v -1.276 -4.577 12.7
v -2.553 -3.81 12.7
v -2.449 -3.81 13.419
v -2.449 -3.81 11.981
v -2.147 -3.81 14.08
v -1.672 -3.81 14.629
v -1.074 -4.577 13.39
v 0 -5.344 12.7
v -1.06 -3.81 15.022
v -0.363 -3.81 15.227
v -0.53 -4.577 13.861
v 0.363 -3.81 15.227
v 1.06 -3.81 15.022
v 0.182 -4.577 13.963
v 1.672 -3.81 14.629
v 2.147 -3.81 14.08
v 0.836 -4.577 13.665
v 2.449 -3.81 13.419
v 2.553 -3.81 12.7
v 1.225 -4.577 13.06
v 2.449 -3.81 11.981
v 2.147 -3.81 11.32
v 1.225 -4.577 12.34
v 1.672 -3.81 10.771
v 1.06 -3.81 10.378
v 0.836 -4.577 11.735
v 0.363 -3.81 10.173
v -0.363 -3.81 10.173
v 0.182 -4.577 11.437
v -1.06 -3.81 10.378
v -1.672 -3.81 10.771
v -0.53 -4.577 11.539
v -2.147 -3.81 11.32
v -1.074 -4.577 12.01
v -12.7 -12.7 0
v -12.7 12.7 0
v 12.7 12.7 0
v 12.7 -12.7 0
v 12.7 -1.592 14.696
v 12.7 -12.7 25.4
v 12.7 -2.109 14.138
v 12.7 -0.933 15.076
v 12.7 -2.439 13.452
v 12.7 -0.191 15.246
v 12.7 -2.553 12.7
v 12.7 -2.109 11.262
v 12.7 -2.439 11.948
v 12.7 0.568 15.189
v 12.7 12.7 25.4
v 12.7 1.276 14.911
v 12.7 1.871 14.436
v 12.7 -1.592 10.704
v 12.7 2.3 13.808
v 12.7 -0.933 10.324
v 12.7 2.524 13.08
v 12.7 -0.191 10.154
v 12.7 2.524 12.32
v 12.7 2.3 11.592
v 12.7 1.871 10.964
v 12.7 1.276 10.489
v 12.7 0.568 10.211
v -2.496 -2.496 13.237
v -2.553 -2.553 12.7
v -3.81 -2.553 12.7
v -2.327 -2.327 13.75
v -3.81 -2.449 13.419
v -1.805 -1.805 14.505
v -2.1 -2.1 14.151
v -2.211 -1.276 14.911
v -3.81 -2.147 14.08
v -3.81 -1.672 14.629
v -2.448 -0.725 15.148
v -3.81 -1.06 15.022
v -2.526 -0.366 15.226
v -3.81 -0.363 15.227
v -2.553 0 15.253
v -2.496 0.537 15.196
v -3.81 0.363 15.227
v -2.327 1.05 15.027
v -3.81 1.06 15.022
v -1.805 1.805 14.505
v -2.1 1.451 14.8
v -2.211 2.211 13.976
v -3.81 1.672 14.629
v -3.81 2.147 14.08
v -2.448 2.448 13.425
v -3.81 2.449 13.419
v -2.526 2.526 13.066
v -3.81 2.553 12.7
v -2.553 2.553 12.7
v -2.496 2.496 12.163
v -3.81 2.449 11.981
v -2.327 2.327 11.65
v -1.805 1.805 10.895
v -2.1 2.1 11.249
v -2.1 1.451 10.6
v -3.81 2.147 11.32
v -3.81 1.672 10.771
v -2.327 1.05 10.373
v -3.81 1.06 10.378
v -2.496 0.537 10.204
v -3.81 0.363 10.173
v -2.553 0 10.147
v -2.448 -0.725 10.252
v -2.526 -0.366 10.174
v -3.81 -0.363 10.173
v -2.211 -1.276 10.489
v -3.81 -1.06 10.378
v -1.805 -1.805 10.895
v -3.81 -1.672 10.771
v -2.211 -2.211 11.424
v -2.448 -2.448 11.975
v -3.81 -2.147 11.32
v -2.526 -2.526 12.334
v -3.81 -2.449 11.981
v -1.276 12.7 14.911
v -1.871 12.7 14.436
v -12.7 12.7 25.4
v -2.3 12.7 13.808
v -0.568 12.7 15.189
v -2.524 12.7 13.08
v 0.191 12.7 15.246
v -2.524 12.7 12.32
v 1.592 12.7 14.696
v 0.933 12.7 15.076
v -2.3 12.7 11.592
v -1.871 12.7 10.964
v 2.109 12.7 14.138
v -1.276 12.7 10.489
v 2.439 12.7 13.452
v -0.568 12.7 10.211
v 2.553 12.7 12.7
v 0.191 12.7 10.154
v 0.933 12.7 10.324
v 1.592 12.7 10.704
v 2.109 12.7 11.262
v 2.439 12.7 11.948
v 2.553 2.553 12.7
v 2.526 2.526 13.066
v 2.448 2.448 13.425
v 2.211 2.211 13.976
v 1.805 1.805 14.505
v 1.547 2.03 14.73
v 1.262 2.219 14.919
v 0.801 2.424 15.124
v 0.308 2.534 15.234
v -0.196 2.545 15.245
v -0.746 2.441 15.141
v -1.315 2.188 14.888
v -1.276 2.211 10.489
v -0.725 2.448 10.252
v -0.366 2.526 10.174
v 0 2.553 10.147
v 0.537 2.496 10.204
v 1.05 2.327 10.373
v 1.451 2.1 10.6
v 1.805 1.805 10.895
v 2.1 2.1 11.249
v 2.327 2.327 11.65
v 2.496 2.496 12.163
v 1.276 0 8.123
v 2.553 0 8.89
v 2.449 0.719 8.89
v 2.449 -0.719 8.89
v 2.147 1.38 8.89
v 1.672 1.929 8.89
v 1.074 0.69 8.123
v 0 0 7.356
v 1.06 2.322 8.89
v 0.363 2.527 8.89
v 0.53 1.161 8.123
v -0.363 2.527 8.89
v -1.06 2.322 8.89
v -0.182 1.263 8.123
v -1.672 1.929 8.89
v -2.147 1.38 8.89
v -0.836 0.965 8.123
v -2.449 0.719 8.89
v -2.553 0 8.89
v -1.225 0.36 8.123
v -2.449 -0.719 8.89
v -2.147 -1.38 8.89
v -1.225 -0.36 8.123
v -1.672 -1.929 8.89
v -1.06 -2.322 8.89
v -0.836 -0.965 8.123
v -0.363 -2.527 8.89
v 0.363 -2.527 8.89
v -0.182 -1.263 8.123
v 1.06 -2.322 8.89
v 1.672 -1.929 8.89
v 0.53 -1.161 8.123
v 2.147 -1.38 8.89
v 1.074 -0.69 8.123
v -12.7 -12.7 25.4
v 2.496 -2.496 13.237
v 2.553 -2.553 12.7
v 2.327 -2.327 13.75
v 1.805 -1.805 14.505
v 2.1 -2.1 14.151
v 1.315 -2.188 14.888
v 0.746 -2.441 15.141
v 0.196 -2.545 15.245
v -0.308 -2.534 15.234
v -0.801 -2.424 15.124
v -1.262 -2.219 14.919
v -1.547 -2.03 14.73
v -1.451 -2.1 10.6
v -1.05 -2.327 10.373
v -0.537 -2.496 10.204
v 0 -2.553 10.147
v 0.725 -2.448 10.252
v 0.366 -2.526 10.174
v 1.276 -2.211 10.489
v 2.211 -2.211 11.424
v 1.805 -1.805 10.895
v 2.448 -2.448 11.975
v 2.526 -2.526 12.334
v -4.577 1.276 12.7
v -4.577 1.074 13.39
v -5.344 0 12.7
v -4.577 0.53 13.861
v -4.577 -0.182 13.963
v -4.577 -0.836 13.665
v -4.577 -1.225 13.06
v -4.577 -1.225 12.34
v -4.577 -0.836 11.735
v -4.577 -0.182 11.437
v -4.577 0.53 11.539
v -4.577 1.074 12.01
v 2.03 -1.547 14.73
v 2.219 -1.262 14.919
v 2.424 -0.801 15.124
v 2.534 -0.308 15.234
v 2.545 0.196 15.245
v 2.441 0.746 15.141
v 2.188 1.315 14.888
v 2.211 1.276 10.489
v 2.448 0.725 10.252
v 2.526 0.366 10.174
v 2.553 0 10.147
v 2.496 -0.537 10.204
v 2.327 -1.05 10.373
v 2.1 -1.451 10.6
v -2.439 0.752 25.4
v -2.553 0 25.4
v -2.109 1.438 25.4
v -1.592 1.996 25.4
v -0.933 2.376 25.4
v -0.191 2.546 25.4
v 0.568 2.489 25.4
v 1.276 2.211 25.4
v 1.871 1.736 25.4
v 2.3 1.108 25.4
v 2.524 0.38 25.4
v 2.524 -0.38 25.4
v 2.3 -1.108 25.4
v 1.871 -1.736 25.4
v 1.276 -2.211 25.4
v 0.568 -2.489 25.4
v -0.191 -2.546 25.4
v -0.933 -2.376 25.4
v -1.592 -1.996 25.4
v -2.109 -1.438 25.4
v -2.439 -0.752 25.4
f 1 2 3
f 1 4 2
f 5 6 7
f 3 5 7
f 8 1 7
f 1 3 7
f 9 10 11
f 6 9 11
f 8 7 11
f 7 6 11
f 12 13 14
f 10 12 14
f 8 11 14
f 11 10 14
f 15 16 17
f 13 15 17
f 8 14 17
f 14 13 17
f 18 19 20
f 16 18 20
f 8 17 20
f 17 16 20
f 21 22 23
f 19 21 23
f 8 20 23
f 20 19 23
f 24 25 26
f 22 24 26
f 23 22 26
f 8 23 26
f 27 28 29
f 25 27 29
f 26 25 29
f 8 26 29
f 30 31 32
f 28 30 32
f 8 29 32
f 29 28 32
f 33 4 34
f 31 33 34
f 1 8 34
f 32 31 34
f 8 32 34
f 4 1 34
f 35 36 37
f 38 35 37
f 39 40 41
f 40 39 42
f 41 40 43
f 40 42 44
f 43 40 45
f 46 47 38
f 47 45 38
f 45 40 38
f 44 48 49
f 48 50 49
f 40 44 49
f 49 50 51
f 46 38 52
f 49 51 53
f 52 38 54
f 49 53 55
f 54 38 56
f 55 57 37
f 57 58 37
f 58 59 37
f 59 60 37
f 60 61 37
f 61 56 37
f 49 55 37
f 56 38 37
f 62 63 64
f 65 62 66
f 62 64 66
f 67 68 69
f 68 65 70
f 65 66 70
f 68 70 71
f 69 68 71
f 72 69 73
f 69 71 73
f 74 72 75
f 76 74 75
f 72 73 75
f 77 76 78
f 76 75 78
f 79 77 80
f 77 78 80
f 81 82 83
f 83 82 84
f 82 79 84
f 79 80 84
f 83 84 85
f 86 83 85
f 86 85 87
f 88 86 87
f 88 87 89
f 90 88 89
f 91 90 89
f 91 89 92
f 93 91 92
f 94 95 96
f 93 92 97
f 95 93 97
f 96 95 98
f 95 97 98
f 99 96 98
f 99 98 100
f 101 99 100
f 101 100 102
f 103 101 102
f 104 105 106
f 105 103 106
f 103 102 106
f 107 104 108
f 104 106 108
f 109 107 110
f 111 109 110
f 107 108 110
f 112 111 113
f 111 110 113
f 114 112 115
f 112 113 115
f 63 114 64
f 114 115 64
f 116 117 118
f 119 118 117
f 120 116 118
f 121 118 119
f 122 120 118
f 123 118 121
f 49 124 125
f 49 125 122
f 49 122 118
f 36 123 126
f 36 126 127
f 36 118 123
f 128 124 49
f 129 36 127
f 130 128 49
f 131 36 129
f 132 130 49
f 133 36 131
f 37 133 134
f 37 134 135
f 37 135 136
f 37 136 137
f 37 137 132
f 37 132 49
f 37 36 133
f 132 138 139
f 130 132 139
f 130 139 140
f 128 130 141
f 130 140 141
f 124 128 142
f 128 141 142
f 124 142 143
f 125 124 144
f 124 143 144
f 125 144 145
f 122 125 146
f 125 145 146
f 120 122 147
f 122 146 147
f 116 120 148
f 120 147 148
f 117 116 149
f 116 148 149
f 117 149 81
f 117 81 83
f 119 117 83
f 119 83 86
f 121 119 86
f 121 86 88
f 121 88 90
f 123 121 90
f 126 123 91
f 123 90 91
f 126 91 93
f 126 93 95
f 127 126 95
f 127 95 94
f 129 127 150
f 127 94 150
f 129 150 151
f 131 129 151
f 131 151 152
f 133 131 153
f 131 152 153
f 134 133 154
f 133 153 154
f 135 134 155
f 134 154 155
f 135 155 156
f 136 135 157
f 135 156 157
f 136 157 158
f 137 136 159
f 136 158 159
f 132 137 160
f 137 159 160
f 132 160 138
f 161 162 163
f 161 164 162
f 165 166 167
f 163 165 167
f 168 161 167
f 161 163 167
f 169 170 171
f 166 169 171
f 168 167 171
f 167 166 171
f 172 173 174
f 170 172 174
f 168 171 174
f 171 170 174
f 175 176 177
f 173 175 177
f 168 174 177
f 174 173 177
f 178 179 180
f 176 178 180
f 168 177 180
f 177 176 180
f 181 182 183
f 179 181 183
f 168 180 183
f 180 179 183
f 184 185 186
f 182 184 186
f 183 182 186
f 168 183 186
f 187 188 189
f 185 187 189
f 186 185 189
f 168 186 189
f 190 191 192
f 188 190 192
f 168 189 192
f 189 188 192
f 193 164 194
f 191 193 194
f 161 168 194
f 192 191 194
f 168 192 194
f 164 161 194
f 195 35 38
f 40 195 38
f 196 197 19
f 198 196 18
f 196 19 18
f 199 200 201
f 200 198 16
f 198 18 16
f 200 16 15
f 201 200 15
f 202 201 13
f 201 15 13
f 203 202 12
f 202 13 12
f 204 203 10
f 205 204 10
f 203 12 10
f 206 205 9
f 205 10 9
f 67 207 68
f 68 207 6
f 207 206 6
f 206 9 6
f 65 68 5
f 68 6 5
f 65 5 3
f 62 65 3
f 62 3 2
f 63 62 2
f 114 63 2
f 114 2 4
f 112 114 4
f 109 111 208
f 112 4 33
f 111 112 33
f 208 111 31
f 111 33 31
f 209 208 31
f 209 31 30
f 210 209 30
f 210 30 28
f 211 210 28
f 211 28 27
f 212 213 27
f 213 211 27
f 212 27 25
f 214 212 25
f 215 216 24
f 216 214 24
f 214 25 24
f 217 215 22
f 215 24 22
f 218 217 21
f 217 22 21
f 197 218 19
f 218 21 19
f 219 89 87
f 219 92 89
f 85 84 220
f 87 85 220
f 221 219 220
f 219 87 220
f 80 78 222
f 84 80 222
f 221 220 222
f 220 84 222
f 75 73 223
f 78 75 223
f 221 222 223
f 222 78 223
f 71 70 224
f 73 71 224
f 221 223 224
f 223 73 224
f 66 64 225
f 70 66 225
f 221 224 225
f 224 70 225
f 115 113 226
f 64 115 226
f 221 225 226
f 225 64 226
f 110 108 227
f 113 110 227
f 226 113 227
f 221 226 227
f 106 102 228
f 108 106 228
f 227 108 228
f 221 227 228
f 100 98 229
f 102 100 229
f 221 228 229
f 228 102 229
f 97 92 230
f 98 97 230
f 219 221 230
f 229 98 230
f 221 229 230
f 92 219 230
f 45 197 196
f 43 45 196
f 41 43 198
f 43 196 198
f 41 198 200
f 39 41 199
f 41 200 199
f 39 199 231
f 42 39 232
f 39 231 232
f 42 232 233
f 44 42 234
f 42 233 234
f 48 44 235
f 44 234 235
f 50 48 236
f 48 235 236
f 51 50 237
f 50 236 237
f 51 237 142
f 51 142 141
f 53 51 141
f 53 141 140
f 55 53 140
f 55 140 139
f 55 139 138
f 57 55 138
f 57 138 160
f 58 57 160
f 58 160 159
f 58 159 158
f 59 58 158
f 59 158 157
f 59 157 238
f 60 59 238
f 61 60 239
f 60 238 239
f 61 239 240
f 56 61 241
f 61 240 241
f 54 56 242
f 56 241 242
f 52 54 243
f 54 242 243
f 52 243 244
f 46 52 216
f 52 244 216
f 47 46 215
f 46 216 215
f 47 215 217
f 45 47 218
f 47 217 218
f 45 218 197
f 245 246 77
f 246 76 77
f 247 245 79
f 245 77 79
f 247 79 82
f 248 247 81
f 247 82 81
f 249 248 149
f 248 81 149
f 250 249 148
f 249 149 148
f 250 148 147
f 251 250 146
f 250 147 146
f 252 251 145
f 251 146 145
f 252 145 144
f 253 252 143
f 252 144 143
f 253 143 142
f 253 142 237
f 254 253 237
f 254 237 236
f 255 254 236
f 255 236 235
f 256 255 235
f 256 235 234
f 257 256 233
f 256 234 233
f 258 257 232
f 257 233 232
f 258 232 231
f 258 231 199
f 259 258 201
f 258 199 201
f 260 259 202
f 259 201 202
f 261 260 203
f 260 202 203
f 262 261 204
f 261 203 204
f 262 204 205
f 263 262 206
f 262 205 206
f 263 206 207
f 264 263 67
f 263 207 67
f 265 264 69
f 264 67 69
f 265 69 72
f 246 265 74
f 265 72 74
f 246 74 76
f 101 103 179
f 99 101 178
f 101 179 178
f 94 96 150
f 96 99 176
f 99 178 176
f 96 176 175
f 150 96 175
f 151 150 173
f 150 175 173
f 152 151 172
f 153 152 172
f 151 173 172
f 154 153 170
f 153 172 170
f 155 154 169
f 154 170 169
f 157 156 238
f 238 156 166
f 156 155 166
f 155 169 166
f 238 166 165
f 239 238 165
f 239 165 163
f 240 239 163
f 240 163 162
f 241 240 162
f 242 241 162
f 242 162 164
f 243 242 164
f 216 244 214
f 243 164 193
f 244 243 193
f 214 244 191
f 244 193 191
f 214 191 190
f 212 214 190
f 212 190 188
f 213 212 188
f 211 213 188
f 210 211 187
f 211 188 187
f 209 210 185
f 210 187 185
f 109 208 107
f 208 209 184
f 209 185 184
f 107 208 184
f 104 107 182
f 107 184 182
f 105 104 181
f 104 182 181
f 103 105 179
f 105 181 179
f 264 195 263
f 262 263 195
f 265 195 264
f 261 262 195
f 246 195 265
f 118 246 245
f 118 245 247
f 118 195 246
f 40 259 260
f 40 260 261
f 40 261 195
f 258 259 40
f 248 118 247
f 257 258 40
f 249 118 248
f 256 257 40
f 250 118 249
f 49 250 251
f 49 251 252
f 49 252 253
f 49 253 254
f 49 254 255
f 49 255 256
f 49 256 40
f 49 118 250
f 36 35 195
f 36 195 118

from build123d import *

# Parameters (mm, degrees)
F0_W           = 25.4
F0_H           = 25.4
F1_DEPTH       = 25.4
F5_D           = 5.1054
F5_DEPTH       = 16.51
F5_TIP         = 1.5338169022
F5_ON_F3_D     = 5.1054
F5_ON_F3_DEPTH = 16.51
F5_ON_F3_TIP   = 1.5338169022
F5_ON_F4_D     = 5.1054
F5_ON_F4_DEPTH = 16.51
F5_ON_F4_TIP   = 1.5338169022


with BuildPart() as f1:
    # F0 (on Top) → F1 (new body)
    with BuildSketch(Plane.XY):
        Rectangle(F0_W, F0_H)
    extrude(amount=F1_DEPTH)

    # F5
    with Locations(Plane.XY.offset(25.4)):
        with Locations((0, 0)):
            Hole(F5_D / 2, depth=F5_DEPTH)
            with Locations((0, 0, -(F5_DEPTH + F5_TIP / 2))):  # 118° drill point
                Cone(0, F5_D / 2, F5_TIP, mode=Mode.SUBTRACT)

    # F5 on F3
    with Locations(Plane.YZ.offset(12.7)):
        with Locations((0, 12.7)):
            Hole(F5_ON_F3_D / 2, depth=F5_ON_F3_DEPTH)
            with Locations((0, 0, -(F5_ON_F3_DEPTH + F5_ON_F3_TIP / 2))):  # 118° drill point
                Cone(0, F5_ON_F3_D / 2, F5_ON_F3_TIP, mode=Mode.SUBTRACT)

    # F5 on F4
    with Locations(Plane(origin=(0, 12.7, 0), x_dir=(-1, 0, 0), z_dir=(0, 1, 0))):
        with Locations((0, 12.7)):
            Hole(F5_ON_F4_D / 2, depth=F5_ON_F4_DEPTH)
            with Locations((0, 0, -(F5_ON_F4_DEPTH + F5_ON_F4_TIP / 2))):  # 118° drill point
                Cone(0, F5_ON_F4_D / 2, F5_ON_F4_TIP, mode=Mode.SUBTRACT)


solid = f1.part
